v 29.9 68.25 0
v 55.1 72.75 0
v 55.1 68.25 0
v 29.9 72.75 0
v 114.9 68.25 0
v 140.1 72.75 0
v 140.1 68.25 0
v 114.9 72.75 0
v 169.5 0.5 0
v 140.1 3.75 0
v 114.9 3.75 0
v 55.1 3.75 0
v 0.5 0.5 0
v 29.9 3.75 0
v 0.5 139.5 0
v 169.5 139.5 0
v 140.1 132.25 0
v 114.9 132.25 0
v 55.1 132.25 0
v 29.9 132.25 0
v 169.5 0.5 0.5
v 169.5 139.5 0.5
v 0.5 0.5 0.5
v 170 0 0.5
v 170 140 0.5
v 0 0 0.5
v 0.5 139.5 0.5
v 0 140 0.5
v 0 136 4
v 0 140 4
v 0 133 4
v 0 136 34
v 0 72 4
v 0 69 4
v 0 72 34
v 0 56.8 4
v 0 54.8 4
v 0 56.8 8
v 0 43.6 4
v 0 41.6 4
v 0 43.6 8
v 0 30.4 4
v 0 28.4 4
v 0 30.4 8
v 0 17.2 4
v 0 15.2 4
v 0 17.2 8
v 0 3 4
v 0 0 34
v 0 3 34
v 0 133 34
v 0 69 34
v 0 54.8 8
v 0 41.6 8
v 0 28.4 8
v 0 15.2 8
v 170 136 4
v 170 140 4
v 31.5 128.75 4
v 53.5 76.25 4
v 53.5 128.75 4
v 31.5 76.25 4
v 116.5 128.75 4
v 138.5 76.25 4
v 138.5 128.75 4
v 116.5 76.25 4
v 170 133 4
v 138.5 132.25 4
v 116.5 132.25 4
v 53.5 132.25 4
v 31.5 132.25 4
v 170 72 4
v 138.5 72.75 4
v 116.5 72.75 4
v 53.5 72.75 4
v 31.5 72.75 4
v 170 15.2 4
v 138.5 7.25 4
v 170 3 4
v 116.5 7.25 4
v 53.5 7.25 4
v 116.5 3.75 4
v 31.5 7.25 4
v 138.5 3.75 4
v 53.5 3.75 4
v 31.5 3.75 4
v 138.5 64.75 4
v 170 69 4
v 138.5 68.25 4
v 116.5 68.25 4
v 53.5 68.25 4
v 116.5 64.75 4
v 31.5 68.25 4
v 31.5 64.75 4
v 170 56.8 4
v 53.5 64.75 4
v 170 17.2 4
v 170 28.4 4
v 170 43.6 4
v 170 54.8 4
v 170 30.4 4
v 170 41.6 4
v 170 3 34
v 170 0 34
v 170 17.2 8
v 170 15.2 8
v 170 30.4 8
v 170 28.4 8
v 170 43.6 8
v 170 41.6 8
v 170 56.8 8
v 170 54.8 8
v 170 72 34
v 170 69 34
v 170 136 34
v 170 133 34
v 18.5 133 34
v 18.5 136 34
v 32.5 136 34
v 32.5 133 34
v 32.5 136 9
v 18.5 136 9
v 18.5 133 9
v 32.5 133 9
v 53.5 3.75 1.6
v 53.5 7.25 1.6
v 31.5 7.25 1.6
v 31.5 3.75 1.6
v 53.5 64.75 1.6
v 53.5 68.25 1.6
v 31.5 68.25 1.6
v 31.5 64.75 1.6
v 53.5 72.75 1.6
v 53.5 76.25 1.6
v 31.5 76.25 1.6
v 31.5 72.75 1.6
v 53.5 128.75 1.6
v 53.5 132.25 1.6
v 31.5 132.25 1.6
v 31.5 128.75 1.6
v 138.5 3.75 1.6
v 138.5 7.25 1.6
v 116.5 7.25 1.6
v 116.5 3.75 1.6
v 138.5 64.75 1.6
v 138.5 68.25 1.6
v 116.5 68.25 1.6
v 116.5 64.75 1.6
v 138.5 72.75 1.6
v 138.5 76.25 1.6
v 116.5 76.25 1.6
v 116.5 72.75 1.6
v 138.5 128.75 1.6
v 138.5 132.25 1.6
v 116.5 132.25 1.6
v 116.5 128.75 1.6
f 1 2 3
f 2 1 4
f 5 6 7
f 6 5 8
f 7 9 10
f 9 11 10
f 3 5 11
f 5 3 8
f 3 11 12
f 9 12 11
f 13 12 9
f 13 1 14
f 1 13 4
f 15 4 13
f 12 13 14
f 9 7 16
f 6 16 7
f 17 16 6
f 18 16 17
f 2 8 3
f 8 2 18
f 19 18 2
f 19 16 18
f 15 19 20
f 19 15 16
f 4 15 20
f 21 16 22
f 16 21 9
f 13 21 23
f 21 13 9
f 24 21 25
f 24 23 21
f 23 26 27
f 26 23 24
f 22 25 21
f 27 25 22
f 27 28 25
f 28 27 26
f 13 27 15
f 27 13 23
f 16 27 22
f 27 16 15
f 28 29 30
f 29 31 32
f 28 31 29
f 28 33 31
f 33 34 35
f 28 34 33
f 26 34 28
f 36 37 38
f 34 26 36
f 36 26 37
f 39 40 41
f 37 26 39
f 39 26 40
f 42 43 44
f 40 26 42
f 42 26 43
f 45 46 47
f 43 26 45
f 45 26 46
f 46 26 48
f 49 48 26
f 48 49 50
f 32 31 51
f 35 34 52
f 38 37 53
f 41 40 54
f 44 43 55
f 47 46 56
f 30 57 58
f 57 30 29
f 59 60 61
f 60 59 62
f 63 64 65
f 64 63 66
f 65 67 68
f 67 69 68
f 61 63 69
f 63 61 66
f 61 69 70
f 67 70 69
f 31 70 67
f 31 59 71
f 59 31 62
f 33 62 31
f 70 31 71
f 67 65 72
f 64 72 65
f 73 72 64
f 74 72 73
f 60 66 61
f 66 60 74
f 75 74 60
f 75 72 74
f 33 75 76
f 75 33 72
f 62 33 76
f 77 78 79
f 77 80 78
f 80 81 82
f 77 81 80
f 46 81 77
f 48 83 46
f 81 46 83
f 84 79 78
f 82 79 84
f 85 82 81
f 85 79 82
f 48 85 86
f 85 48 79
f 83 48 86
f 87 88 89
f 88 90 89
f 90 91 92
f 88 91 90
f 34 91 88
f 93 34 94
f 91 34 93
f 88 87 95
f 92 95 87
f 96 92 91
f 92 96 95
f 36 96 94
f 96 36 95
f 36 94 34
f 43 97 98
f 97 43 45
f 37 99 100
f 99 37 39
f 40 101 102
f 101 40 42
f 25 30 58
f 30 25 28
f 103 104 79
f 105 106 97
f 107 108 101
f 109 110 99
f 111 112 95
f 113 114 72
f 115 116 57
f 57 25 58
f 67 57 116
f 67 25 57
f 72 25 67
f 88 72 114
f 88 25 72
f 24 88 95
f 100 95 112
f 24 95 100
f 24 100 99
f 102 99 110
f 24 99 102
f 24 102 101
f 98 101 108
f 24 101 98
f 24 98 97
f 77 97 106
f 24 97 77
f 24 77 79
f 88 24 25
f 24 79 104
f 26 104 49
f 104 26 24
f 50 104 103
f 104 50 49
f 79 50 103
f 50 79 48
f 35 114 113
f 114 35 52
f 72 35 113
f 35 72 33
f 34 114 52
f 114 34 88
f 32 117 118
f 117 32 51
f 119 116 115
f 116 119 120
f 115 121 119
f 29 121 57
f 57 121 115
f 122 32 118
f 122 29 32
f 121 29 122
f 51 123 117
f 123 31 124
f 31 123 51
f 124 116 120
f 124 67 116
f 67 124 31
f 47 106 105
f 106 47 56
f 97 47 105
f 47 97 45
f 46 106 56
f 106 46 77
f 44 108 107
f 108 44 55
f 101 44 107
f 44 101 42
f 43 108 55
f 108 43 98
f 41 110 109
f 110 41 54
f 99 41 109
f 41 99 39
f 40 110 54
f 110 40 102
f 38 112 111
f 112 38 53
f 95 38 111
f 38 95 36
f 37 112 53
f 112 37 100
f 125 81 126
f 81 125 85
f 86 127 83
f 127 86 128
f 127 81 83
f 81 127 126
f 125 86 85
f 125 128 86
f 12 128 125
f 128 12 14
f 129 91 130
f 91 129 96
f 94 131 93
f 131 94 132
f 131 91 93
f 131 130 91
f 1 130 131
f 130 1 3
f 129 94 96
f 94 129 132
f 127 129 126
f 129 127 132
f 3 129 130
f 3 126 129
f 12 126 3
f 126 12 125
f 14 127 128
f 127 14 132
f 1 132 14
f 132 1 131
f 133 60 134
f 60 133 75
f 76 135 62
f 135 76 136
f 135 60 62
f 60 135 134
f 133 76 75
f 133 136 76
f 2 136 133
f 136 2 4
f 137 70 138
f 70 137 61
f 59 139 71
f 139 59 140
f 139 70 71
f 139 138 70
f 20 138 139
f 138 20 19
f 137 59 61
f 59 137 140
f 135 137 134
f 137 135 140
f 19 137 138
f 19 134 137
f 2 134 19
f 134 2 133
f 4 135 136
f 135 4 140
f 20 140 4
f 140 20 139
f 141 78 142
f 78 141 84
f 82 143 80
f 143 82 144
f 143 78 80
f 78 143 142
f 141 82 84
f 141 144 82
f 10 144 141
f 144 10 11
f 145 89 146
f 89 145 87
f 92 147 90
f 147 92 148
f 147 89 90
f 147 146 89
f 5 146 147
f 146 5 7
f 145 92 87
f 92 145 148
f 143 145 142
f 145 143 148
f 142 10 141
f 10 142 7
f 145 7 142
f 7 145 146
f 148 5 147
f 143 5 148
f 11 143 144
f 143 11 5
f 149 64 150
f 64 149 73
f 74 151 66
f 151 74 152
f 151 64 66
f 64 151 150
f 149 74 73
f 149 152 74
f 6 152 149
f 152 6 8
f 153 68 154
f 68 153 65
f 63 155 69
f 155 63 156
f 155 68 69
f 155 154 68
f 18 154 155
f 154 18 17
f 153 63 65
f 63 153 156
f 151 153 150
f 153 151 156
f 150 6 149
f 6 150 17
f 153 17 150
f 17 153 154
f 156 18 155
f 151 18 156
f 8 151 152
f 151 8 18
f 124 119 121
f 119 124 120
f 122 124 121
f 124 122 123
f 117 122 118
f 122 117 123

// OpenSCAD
// file: params.scad
// ===========================================================================
//  Apache 4800 cyberdeck v2 - shared parameters (all mm)
//  Every part file includes this through parts.scad.
//  Values marked [CHECK] are defaults from the spec: measure the real part and
//  change them here, then run build.cmd again to re-export every STL.
// ===========================================================================

// ---- printer limits --------------------------------------------------------
bed_max    = 175;      // max footprint X and Y
height_max = 150;

// ---- case: Harbor Freight Apache 4800 ---------------------------------------
case_in      = [454, 327];  // interior at the rim (listed)
tray         = [444, 312];  // [CHECK] printed tray outline = floor at the very bottom
tray_r       = 20;          // [CHECK] inside corner radius
base_depth   = 115;         // [CHECK] floor to rim
lid_depth    = 44;          // [CHECK]
height_limit = 100;         // nothing in the base taller than this above the floor

// ---- floor tiles (3 x 2) -----------------------------------------------------
tile_cols = 3;
tile_rows = 2;
tile_t    = 4;
tile_gap  = 0.4;                       // total gap between neighbouring tiles
tile_sz   = [tray[0] / tile_cols, tray[1] / tile_rows];   // 148 x 156
vent_sz     = 15;
vent_pitch  = 25;
vent_margin = 8;                       // keep vents this far from tile edges
chamfer     = 0.5;                     // bottom-edge chamfer (elephant foot)

// ---- tile joints (dovetail tabs printed on the tiles - no loose keys) -------
tab_neck  = 10;      // width where the tab leaves its tile
tab_head  = 16;      // width at the tip (wider = locks)
tab_len   = 10;      // how far it reaches into the next tile
tab_clear = 0.2;     // gap around the tab in the socket (per side); raise if too tight

// ---- Velcro straps ------------------------------------------------------------
strap_w      = 22;   // slot length (20 mm strap + room)
strap_slot_t = 3.5;  // slot width
strap_groove = 1.6;  // groove depth under a floor for the strap (leaves >= 2.4 mm of floor)

// ---- layout (top view; origin = front-left of tray, X right, Y to hinge) ----
// [x0, y0, x1, y1]
hub_box    = [75,   6, 245,  56];
pi_box     = [75,  60, 245, 138];
power_box  = [75, 142, 245, 282];
switch_box = [2.5, 12.5, 72.5, 117.5];
signal_lane = [0, 286, tray[0], 298];
power_lane  = [0, 300, tray[0], 312];

// ---- the PC: Minisforum UM870 Slim (names still say k12 so nothing else breaks) ----
k12      = [130, 126.5, 50.4];    // listed (was GMKtec K12: 154 x 151 x 73.6)
k12_pos  = [266, 40];             // front-left corner on the tray (same spot as the K12)
// [CHECK] open air behind the PC: assumes it blows hot air out the back.
// Once the UM870 is here, check where its vents really are.
rear_air = [k12_pos[0], k12_pos[1] + k12[1], 420, 286];
plinth_margin = 8;
plinth_h      = 15;
plinth_rim    = 8;                // solid border: corner guides sit fully on it
hex_cell      = 10;               // across flats
hex_wall      = 2;
plinth_post_front_h = 20;         // above the honeycomb
plinth_post_rear_h  = 10;         // keep the rear exhaust clear (spec: <= 10)
plinth_post_leg     = 15;
plinth_post_t       = 3;
k12_clear           = 1;
plinth_box = [k12_pos[0] - plinth_margin, k12_pos[1] - plinth_margin,
              k12_pos[0] + k12[0] + plinth_margin, k12_pos[1] + k12[1] + plinth_margin];

// ---- USB hub (Vantisan) -----------------------------------------------------------
hub      = [161, 42, 25];        // measured
hub_fit  = 1;                    // clearance (total)
hub_wall_h       = 16;           // back/side walls above the floor
hub_front_wall_h = 8;            // [CHECK] low front wall: ports face up/front
hub_floor        = 4;
hub_cable_end    = "right";      // cable exit notch end: "right" (toward the PC) or "left"

// ---- Raspberry Pi 5 in CanaKit case ------------------------------------------------
pi_case   = [95, 65, 30];        // measured (height est.)
pi_fit    = 1;
pi_floor  = 4;
pi_guide_h  = 12;
pi_vent_gap = 15;                // open space between Pi and the cable cubby
cubby_wall_h = 15;

// ---- power bay ------------------------------------------------------------------
brick  = [150, 65, 35];          // [CHECK] PC 120 W brick (UM870: 19 V / 6.32 A) - measure it
strip  = [130, 60, 40];          // [CHECK] compact 3-outlet surge strip
power_floor  = 4;
power_wall_h = 30;               // above the floor
power_wall_t = 3;
brick_rib_h  = 4;                // air gap under the brick

// ---- network switch -----------------------------------------------------------------
switch_sz   = [65, 100, 25];     // [CHECK] (X = width, Y = length, ports at back)
switch_fit  = 1;
switch_floor  = 4;
switch_wall_h = 12;

// ---- cable lanes ---------------------------------------------------------------------
rib_h      = 10;
rib_t      = 2.4;
rib_foot_w = 8;
rib_foot_t = 2;
rib_y      = 299;                // centre line between the lanes
comb_w     = 20;                 // comb thickness along the lane

// ---- left-wall side panel -------------------------------------------------------------
panel      = [150, 60];
panel_outer_t = 4;
panel_inner_t = 3;
wall_cutout   = [135, 42];       // [CHECK] must sit inside the flat area of the wall
panel_y_center = 215;            // along the case wall (tray Y)
keystone_hole  = [14.5, 16.0];   // print keystone_test.stl first and adjust
keystone_relief = [17.5, 24];    // back-side pocket so the latch sees a thin plate
keystone_latch_t = 2.0;          // plate thickness where the keystone clips on
keystone_pitch = 19.5;
// Power entry: "iec" = snap-in C14 inlet (recommended - see README) or "slot" = cord slot
power_entry  = "iec";
iec_hole     = [27.5, 19.8];     // [CHECK] snap-in C14 inlet cutout
iec_relief   = [31, 24];
iec_latch_t  = 2.0;
cord_slot    = [25, 12];
m4_hole      = 4.3;
labels = ["LAN", "PC", "MIC", "AUD", "USB", "PWR"];
cover_clear  = 9;                // room in front of the plate for couplers/bolt heads

// ---- lid monitor clips (ViewSonic VA1655) ------------------------------------------------
monitor     = [359, 227];        // listed (spec value used; re-measure the width)
mon_thick   = 20;                // thick edge (measured)
mon_thin    = 10;                // thin edge (measured)
thick_edge  = "bottom";          // [CHECK] "bottom" = hinge side when the lid is open
foam_t      = 1.5;               // foam on every face touching the monitor
clip_wall_t = 3;
clip_lip    = 3;                 // overlap onto the bezel only
clip_lip_t  = 2.5;
clip_buttress = 12;              // VHB foot width outside the wall
clip_leg    = 45;                // leg length along the monitor edge, from the corner
clip_port_leg = 20;              // [CHECK] shorter leg along the RIGHT edge (port zone)

// ---- print settings reference (set these in the slicer) ---------------------------------
// 0.4 nozzle, 0.2 layers, 4 walls, 25-30% gyroid
// holes already include +0.3 mm
$fn = 48;
// main file
// Power bay: PC brick + surge strip U-channels.
include <parts.scad>
power_cradle();
